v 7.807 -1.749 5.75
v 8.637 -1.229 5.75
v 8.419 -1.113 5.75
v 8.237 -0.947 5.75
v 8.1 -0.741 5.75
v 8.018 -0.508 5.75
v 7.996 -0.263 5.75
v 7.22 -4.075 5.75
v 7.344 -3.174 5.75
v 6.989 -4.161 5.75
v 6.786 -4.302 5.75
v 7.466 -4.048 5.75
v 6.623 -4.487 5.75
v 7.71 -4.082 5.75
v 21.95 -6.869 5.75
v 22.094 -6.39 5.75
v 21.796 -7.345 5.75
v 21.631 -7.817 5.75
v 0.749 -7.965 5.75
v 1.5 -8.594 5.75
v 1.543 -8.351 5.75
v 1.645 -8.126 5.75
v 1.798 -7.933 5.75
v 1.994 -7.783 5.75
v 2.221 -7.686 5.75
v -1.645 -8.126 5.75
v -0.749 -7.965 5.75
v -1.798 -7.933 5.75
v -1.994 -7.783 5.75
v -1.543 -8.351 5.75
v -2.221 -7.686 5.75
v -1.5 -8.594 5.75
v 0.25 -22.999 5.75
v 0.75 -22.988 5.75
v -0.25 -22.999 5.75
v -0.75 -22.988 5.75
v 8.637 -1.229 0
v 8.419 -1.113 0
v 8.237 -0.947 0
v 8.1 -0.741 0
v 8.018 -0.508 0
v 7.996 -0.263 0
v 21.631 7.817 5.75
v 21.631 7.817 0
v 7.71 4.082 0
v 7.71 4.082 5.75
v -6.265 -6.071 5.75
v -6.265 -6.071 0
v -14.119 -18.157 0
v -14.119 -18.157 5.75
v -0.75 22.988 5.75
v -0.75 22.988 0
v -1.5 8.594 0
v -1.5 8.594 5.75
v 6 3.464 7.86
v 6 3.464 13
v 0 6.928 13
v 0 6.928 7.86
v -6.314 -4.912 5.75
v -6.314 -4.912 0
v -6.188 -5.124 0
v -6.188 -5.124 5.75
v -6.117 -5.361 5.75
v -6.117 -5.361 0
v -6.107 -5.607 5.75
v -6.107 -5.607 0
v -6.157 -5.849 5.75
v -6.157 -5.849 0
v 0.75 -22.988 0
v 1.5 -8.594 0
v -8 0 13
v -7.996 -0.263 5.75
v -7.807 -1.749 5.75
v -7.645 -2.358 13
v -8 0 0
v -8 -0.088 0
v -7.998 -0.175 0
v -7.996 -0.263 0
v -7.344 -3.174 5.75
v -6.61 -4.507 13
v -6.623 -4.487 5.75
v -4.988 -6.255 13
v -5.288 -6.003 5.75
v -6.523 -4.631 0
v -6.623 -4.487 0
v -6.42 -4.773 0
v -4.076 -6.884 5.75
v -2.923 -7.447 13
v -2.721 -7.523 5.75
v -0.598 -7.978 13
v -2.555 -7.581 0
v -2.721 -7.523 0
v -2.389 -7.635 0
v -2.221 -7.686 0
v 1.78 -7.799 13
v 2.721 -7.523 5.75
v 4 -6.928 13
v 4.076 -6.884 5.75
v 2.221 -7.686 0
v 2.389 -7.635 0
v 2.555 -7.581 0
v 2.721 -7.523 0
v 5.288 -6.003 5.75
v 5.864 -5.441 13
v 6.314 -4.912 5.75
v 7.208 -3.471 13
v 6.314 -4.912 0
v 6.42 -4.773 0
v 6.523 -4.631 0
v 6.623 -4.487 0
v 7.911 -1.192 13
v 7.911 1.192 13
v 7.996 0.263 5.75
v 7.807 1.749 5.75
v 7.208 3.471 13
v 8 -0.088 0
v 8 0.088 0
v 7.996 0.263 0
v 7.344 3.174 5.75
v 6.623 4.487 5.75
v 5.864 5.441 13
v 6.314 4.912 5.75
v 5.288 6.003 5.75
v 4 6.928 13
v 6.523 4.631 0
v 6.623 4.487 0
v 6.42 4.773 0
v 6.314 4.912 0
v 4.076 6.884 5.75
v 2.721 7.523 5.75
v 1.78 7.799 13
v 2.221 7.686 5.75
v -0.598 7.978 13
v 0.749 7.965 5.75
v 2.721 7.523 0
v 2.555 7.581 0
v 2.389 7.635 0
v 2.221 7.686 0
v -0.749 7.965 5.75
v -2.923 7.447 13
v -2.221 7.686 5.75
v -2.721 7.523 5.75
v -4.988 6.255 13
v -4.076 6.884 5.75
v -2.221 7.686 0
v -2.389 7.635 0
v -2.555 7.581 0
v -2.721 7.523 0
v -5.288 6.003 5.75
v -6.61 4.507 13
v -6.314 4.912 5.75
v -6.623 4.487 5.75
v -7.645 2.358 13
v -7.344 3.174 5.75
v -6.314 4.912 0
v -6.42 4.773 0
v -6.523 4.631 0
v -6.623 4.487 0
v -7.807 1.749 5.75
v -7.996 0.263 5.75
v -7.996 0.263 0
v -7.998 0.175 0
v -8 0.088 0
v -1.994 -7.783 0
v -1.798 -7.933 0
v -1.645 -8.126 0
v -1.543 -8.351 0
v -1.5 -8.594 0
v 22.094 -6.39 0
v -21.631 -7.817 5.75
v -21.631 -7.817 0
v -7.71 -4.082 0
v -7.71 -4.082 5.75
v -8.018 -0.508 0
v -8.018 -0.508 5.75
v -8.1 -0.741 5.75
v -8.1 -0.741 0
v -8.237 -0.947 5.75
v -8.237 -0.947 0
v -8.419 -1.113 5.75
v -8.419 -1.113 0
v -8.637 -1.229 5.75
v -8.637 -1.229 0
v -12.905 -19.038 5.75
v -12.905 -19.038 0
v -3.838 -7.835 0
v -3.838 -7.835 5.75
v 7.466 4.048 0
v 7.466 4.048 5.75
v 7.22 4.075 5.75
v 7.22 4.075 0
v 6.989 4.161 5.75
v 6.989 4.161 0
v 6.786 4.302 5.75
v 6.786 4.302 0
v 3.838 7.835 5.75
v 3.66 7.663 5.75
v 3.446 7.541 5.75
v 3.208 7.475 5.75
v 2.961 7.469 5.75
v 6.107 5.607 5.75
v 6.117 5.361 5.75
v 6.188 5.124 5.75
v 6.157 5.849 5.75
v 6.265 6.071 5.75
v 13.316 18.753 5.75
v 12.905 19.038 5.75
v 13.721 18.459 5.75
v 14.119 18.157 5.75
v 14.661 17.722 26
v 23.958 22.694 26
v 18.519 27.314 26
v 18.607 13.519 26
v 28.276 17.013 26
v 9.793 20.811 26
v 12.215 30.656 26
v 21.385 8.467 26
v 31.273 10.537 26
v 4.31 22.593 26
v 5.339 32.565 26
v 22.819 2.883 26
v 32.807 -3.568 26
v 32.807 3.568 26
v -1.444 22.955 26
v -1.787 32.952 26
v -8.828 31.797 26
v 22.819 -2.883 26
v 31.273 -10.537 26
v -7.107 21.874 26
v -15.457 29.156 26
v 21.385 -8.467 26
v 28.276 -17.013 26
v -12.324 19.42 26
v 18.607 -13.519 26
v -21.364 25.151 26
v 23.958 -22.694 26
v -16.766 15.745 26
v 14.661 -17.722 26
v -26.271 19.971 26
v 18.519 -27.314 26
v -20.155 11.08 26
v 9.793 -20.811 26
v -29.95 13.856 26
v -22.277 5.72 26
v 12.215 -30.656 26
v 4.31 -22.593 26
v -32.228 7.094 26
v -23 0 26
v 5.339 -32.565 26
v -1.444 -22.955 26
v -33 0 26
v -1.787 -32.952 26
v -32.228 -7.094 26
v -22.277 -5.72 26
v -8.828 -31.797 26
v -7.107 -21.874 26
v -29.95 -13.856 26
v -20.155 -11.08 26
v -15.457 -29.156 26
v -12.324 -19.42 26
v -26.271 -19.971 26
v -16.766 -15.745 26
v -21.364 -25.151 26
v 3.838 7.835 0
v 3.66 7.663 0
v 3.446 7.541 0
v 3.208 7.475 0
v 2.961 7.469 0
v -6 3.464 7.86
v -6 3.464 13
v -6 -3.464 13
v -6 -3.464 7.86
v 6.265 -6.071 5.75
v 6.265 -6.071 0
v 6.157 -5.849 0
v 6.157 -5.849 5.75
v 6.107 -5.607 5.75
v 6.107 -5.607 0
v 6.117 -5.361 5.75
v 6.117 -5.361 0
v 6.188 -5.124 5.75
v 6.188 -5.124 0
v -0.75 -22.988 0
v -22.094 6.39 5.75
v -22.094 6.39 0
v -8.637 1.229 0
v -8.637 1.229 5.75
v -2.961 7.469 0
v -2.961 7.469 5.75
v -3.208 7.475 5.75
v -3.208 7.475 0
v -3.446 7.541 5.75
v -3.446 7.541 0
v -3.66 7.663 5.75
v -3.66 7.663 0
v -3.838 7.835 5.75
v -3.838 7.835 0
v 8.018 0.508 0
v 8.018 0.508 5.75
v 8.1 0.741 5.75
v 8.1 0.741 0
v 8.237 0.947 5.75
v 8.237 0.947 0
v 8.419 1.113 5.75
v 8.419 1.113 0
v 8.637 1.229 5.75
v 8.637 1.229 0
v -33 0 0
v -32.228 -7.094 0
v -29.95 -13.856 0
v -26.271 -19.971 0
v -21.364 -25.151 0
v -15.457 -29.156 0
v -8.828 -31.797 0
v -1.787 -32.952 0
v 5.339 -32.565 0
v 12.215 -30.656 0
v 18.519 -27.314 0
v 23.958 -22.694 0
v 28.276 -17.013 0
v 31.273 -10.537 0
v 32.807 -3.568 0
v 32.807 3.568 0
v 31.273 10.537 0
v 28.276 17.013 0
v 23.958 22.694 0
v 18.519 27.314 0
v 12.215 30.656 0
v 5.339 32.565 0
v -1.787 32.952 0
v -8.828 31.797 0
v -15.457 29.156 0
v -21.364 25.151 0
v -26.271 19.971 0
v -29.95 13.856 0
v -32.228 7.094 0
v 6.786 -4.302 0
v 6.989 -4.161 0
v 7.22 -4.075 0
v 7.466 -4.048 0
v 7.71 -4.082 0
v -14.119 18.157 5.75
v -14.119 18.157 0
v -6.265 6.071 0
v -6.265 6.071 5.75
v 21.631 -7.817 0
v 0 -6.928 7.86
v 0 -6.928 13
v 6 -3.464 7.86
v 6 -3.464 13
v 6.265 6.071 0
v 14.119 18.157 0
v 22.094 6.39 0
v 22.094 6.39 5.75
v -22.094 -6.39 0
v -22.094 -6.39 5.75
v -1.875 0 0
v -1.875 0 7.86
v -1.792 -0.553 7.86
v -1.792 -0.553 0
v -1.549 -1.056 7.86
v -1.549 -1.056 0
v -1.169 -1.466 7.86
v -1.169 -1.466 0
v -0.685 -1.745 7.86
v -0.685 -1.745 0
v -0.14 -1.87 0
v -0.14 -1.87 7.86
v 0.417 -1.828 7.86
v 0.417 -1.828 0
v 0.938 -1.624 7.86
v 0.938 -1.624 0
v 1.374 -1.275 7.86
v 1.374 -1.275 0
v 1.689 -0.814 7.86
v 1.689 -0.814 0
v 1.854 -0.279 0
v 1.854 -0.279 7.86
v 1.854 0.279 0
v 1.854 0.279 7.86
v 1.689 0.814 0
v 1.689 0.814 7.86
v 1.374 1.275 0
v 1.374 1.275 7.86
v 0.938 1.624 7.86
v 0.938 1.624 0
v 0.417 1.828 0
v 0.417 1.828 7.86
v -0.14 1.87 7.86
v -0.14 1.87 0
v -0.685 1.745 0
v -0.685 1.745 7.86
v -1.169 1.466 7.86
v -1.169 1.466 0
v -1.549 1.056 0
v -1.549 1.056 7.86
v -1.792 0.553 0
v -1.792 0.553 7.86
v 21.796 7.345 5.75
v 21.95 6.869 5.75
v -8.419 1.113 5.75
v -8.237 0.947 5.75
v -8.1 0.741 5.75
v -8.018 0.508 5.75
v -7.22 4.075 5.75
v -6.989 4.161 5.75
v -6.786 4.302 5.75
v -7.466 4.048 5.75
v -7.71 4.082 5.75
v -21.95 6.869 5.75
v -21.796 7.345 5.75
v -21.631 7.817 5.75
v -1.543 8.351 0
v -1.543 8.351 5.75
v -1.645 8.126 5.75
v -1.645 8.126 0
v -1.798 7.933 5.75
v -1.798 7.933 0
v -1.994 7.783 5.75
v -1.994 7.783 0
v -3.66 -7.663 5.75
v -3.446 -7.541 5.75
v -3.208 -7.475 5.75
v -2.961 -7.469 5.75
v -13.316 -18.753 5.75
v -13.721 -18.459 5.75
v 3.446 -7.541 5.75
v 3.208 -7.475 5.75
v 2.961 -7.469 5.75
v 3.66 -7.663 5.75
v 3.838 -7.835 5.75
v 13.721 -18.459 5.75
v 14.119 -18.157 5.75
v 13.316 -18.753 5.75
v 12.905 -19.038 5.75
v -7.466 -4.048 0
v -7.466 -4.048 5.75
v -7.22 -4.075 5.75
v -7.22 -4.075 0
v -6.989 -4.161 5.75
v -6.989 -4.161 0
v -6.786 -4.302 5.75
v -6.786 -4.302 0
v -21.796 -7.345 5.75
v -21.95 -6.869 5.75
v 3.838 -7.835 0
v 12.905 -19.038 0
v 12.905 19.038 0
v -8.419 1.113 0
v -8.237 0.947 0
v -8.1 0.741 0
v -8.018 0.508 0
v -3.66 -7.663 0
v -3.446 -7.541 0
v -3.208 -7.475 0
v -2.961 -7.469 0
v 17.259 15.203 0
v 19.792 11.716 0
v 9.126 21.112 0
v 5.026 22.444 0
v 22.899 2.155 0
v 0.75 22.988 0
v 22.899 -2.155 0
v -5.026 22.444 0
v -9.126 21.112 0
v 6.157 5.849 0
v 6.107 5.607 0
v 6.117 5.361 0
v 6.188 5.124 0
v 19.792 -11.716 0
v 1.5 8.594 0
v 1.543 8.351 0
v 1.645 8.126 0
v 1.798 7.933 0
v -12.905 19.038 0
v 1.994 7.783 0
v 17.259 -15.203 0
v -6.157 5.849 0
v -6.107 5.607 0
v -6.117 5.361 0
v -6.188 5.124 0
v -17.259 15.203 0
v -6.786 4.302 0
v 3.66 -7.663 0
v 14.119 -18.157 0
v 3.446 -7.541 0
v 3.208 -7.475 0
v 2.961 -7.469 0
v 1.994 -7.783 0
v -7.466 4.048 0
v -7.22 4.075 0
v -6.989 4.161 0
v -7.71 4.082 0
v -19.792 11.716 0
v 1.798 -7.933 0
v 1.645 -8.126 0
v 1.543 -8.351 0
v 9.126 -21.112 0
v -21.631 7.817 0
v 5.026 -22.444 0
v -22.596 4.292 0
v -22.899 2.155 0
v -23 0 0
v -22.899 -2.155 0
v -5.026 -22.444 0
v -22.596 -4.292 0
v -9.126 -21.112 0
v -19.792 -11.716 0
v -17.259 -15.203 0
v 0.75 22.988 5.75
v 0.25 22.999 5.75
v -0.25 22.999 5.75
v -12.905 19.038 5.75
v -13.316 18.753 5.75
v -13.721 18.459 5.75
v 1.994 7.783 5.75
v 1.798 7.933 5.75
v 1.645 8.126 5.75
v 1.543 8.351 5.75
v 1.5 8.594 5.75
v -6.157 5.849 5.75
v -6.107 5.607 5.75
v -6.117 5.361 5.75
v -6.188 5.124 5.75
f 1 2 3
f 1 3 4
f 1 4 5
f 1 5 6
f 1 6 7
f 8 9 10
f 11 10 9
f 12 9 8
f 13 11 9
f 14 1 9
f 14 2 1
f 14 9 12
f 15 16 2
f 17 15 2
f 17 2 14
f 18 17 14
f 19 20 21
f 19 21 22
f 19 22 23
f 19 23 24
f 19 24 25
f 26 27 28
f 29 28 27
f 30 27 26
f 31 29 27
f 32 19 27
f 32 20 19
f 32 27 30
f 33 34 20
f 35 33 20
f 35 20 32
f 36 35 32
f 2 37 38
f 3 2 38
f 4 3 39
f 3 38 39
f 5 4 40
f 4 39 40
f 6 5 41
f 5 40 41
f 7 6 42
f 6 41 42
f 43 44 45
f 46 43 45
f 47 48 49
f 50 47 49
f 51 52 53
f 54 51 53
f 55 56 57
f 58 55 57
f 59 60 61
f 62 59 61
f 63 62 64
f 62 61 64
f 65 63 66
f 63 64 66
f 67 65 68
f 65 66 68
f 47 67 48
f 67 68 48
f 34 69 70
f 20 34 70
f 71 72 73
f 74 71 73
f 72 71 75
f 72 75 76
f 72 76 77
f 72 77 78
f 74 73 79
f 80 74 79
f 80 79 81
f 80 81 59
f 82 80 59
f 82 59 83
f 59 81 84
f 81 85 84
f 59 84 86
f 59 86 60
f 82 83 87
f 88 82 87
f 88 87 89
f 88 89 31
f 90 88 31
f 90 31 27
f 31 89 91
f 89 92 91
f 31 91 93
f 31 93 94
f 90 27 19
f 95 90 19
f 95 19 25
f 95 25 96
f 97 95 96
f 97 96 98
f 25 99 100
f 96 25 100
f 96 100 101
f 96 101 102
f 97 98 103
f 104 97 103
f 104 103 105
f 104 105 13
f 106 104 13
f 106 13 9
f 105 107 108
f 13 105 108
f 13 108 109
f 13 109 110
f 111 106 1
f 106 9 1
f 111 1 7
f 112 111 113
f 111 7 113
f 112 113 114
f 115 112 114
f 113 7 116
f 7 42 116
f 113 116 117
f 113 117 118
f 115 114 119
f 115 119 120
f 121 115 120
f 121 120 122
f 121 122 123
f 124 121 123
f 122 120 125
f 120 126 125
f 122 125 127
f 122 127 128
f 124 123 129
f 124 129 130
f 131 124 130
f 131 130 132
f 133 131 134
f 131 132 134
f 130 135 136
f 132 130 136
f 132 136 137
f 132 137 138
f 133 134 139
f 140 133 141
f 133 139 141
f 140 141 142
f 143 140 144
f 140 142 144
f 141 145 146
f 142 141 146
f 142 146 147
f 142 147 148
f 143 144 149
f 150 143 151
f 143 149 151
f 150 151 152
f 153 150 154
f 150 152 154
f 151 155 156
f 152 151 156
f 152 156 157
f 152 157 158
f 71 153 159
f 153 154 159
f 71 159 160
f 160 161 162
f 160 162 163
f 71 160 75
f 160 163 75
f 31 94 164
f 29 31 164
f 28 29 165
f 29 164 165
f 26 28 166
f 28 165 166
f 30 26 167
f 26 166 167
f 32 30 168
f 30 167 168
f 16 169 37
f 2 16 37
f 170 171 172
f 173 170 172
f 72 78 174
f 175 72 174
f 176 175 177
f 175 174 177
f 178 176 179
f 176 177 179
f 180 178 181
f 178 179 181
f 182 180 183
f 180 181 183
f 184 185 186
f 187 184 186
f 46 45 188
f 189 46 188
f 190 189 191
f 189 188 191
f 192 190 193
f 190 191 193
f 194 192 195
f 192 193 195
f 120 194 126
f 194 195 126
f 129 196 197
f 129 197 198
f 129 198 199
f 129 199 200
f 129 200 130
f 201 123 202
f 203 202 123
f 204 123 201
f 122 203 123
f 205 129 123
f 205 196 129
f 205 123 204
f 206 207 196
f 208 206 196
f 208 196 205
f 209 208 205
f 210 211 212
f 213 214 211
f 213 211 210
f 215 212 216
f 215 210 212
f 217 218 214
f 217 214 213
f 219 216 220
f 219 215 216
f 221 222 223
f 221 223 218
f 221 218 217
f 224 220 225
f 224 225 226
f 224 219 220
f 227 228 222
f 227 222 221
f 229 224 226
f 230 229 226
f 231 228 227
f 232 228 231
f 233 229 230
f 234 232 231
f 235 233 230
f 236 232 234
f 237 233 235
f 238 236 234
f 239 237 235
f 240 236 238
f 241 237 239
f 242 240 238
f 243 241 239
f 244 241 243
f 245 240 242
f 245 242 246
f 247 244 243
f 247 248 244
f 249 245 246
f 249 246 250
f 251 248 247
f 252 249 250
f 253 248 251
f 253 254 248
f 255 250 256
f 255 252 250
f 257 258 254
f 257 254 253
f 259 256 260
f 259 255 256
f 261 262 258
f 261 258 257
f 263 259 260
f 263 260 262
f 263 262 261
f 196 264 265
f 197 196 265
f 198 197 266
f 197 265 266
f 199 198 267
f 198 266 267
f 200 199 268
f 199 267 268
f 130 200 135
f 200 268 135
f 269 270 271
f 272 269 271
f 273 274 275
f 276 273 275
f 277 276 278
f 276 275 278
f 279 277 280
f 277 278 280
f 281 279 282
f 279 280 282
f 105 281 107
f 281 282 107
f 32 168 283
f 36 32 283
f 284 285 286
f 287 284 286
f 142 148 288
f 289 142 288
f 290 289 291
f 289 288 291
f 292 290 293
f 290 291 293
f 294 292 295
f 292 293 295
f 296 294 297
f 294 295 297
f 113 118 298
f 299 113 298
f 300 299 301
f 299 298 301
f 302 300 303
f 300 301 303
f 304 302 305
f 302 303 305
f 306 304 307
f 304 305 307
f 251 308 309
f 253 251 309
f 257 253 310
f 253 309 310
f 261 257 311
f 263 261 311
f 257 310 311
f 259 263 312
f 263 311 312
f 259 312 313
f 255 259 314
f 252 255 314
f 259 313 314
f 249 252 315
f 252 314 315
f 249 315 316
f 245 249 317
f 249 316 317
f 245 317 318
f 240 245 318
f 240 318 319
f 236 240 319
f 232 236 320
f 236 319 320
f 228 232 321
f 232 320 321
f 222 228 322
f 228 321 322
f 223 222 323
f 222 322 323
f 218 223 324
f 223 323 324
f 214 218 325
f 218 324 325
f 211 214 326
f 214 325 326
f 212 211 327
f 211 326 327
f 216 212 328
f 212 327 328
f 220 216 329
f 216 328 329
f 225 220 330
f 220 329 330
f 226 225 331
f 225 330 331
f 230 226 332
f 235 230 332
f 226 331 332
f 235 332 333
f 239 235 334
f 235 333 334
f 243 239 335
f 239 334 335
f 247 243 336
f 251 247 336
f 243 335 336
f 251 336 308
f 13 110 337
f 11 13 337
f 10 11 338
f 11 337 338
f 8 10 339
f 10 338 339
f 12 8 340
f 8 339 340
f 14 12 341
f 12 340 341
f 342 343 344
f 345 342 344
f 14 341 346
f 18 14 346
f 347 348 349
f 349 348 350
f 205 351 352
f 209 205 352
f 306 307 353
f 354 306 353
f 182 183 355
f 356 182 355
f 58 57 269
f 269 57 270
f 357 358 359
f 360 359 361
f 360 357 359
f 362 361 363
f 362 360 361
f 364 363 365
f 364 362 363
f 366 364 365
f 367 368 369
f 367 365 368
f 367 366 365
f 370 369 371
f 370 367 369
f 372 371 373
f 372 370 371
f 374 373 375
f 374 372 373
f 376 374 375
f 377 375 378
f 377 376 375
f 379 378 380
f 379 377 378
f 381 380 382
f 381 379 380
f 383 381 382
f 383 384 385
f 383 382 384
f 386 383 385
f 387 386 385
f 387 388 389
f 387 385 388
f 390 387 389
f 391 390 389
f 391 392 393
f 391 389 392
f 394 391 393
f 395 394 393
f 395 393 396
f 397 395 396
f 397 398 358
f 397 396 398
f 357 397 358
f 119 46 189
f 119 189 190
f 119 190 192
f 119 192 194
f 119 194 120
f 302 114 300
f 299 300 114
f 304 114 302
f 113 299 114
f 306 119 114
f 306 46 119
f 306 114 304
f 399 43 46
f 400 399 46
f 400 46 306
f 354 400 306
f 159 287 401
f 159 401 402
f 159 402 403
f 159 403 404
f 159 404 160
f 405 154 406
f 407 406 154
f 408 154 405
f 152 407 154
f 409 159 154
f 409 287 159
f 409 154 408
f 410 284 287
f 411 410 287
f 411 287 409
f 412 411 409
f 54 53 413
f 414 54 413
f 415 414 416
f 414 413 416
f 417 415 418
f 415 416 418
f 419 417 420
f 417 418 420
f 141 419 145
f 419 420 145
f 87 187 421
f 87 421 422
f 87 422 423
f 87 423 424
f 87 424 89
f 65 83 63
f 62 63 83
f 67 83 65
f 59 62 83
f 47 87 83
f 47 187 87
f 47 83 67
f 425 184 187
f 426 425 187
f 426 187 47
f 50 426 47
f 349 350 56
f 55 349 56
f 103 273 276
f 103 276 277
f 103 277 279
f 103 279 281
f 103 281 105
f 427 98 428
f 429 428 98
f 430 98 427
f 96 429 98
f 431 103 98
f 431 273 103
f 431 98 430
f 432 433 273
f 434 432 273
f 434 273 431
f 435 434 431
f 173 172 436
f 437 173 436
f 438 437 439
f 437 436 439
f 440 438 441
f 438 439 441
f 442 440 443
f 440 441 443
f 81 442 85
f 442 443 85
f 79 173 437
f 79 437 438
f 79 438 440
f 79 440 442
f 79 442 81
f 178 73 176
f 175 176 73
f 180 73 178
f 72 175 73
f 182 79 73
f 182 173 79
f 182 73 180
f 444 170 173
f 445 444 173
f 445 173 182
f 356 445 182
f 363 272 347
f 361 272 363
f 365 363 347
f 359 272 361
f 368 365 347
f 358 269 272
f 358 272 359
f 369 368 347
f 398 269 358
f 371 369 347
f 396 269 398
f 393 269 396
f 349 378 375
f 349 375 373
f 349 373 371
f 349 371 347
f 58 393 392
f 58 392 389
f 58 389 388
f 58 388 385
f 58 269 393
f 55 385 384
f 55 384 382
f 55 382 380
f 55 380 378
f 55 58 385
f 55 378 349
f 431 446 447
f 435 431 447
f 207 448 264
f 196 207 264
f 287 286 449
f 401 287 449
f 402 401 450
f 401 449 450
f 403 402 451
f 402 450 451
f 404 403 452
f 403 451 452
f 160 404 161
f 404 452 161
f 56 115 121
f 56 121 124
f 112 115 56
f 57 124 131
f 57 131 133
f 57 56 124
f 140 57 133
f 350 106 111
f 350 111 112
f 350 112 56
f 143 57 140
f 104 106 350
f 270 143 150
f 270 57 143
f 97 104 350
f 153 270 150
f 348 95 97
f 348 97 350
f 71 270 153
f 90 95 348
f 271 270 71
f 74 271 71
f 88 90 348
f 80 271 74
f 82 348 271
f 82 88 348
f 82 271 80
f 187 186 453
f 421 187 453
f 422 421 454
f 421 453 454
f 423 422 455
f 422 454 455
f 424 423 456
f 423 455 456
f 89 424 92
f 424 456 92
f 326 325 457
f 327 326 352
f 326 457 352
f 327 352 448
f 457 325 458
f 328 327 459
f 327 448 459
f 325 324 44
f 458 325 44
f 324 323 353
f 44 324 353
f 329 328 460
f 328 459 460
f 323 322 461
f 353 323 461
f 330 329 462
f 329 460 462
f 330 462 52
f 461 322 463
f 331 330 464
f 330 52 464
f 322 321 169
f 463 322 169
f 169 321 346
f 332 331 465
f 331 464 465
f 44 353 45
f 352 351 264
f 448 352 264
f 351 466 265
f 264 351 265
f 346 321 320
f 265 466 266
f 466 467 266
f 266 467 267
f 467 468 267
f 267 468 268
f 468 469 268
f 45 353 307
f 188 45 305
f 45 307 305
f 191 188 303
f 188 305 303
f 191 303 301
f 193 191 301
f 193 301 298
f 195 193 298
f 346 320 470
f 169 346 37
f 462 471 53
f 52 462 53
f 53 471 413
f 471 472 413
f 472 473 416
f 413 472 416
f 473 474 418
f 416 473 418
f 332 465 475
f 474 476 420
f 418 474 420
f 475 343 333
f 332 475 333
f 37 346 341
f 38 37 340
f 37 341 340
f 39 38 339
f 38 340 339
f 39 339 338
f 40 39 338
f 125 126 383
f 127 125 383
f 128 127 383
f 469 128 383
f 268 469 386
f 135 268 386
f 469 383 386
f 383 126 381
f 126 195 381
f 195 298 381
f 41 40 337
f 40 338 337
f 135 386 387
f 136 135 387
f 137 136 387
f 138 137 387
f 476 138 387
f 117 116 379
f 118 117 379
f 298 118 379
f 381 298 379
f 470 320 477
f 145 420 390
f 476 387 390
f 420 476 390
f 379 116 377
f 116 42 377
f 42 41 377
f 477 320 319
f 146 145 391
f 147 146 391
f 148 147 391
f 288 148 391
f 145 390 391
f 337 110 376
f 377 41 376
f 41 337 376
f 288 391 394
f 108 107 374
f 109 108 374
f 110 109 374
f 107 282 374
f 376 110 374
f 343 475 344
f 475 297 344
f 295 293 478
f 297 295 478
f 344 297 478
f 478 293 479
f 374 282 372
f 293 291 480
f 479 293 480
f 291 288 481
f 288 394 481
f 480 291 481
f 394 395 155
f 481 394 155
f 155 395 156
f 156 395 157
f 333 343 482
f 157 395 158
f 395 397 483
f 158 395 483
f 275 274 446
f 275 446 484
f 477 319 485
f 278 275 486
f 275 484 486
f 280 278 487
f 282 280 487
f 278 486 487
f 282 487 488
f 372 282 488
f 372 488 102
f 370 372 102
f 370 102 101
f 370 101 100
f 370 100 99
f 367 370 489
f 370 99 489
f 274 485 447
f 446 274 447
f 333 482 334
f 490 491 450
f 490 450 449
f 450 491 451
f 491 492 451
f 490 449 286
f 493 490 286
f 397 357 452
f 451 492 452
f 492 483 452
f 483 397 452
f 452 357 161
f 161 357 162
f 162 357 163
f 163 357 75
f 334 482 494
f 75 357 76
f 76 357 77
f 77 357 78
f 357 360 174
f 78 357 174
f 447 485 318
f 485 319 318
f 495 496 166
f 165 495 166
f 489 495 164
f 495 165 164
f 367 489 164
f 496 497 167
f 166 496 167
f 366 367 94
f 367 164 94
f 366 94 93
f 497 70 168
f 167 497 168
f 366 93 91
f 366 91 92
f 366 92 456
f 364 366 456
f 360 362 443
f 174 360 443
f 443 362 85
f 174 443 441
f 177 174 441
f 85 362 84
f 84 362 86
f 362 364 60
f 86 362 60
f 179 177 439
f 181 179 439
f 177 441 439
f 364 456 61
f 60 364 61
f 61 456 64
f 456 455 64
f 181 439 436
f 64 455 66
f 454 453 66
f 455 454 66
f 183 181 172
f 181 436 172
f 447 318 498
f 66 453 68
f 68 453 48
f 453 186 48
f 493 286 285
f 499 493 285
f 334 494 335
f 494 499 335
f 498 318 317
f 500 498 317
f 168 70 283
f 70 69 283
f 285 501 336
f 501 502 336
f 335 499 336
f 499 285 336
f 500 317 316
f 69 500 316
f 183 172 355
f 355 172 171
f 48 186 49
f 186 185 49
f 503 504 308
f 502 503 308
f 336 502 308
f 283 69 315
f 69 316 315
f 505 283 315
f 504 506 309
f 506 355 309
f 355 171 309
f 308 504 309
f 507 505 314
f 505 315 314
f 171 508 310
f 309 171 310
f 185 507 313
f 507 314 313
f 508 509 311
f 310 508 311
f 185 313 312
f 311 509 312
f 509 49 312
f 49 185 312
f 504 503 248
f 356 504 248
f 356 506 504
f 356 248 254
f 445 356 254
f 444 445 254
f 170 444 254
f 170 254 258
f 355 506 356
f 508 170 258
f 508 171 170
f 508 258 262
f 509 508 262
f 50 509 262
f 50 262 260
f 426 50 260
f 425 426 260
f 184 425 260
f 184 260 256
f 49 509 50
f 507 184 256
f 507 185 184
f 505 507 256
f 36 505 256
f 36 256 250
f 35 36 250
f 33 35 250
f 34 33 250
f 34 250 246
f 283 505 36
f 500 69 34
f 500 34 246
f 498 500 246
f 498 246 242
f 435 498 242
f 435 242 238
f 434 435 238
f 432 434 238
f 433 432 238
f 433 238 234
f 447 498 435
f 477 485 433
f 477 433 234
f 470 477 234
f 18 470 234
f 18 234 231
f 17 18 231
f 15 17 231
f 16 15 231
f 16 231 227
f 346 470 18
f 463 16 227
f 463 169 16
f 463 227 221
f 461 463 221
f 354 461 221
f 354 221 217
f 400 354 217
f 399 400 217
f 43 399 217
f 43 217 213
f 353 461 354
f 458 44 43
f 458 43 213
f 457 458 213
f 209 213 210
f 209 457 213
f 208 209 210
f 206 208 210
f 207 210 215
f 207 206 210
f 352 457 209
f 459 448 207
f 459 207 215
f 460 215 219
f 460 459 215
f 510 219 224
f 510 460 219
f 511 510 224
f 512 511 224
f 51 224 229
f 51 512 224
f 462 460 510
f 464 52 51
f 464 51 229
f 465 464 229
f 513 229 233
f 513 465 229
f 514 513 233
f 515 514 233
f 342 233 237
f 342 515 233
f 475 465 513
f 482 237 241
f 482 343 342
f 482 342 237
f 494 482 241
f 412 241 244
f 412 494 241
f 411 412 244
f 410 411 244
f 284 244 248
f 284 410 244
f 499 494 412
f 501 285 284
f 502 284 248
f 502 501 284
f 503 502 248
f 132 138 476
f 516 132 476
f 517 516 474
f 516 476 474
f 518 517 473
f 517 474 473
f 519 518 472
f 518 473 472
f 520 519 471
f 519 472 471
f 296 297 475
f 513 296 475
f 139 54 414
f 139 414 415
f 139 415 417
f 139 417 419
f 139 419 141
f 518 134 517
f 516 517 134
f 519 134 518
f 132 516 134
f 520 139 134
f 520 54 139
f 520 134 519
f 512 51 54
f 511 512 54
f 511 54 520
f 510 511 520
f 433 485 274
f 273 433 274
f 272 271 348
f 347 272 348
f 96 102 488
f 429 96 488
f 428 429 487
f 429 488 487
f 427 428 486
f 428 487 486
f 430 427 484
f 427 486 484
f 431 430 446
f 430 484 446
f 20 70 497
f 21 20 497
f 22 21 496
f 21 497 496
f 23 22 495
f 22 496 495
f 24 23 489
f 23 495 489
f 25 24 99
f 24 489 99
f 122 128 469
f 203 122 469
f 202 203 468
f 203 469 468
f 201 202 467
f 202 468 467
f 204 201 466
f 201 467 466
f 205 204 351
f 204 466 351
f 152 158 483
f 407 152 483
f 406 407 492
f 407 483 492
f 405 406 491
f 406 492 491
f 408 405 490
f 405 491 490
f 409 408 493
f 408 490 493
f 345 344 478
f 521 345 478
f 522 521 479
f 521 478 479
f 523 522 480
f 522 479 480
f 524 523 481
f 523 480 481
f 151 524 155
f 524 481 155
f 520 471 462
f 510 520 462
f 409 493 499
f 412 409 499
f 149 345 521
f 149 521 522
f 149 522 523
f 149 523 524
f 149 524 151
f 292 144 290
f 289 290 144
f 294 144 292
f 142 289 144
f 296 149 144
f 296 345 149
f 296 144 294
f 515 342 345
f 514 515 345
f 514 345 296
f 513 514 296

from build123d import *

# Parameters (mm, degrees)
SKETCH1_R           = 33
SKETCH1_R_2         = 23
BOSS_EXTRUDE1_DEPTH = 26
SKETCH3_R           = 8
SKETCH3_R_2         = 1.875
BOSS_EXTRUDE2_DEPTH = 13
CUT_EXTRUDE1_DEPTH  = 5.14
BOSS_EXTRUDE3_DEPTH = 5.75
CIRPATTERN1_COUNT   = 10


with BuildPart() as part:
    # Sketch1 → Boss-Extrude1 (new body)
    with BuildSketch(Plane.XY):
        Circle(SKETCH1_R)
        Circle(SKETCH1_R_2, mode=Mode.SUBTRACT)
    extrude(amount=BOSS_EXTRUDE1_DEPTH)



with BuildPart() as body_2:
    # Sketch3 → Boss-Extrude2 (new body)
    with BuildSketch(Plane.XY):
        Circle(SKETCH3_R)
        Circle(SKETCH3_R_2, mode=Mode.SUBTRACT)
    extrude(amount=BOSS_EXTRUDE2_DEPTH)

    # Sketch4 → Cut-Extrude1 (cut)
    with BuildSketch(Plane.XY.offset(13)):
        Polygon((0, 6.92820323), (-6, 3.464101615), (-6, -3.464101615), (0, -6.92820323), (6, -3.464101615), (6, 3.464101615), align=None)
    extrude(amount=-CUT_EXTRUDE1_DEPTH, mode=Mode.SUBTRACT)


with BuildPart() as part_1:
    add(part.part)

    add(body_2.part)  # Boss-Extrude3 merges body 2
    # Sketch5 → Boss-Extrude3 (add)
    with BuildSketch(Plane.XY):
        with BuildLine():
            Line((-0.75, 22.987768487), (-1.5, 8.594163981))
            ThreePointArc((-1.5, 8.594163981), (-1.715299562, 8.024613517), (-2.22101797, 7.68551099))
            ThreePointArc((-2.22101797, 7.68551099), (0, 8), (2.22101797, 7.68551099))
            ThreePointArc((2.22101797, 7.68551099), (1.715299562, 8.024613517), (1.5, 8.594163981))
            Line((1.5, 8.594163981), (0.75, 22.987768487))
            ThreePointArc((0.75, 22.987768487), (0, 23), (-0.75, 22.987768487))
        make_face()
    boss_extrude3 = extrude(amount=BOSS_EXTRUDE3_DEPTH)

    # CirPattern1: Boss-Extrude3 ×10 about axis
    cirpattern1_axis = Axis((0, 0, 27.3), (0, 0, -1))
    for i in range(1, CIRPATTERN1_COUNT):
        add(boss_extrude3.rotate(cirpattern1_axis, i * 360 / CIRPATTERN1_COUNT))


solid = part_1.part
